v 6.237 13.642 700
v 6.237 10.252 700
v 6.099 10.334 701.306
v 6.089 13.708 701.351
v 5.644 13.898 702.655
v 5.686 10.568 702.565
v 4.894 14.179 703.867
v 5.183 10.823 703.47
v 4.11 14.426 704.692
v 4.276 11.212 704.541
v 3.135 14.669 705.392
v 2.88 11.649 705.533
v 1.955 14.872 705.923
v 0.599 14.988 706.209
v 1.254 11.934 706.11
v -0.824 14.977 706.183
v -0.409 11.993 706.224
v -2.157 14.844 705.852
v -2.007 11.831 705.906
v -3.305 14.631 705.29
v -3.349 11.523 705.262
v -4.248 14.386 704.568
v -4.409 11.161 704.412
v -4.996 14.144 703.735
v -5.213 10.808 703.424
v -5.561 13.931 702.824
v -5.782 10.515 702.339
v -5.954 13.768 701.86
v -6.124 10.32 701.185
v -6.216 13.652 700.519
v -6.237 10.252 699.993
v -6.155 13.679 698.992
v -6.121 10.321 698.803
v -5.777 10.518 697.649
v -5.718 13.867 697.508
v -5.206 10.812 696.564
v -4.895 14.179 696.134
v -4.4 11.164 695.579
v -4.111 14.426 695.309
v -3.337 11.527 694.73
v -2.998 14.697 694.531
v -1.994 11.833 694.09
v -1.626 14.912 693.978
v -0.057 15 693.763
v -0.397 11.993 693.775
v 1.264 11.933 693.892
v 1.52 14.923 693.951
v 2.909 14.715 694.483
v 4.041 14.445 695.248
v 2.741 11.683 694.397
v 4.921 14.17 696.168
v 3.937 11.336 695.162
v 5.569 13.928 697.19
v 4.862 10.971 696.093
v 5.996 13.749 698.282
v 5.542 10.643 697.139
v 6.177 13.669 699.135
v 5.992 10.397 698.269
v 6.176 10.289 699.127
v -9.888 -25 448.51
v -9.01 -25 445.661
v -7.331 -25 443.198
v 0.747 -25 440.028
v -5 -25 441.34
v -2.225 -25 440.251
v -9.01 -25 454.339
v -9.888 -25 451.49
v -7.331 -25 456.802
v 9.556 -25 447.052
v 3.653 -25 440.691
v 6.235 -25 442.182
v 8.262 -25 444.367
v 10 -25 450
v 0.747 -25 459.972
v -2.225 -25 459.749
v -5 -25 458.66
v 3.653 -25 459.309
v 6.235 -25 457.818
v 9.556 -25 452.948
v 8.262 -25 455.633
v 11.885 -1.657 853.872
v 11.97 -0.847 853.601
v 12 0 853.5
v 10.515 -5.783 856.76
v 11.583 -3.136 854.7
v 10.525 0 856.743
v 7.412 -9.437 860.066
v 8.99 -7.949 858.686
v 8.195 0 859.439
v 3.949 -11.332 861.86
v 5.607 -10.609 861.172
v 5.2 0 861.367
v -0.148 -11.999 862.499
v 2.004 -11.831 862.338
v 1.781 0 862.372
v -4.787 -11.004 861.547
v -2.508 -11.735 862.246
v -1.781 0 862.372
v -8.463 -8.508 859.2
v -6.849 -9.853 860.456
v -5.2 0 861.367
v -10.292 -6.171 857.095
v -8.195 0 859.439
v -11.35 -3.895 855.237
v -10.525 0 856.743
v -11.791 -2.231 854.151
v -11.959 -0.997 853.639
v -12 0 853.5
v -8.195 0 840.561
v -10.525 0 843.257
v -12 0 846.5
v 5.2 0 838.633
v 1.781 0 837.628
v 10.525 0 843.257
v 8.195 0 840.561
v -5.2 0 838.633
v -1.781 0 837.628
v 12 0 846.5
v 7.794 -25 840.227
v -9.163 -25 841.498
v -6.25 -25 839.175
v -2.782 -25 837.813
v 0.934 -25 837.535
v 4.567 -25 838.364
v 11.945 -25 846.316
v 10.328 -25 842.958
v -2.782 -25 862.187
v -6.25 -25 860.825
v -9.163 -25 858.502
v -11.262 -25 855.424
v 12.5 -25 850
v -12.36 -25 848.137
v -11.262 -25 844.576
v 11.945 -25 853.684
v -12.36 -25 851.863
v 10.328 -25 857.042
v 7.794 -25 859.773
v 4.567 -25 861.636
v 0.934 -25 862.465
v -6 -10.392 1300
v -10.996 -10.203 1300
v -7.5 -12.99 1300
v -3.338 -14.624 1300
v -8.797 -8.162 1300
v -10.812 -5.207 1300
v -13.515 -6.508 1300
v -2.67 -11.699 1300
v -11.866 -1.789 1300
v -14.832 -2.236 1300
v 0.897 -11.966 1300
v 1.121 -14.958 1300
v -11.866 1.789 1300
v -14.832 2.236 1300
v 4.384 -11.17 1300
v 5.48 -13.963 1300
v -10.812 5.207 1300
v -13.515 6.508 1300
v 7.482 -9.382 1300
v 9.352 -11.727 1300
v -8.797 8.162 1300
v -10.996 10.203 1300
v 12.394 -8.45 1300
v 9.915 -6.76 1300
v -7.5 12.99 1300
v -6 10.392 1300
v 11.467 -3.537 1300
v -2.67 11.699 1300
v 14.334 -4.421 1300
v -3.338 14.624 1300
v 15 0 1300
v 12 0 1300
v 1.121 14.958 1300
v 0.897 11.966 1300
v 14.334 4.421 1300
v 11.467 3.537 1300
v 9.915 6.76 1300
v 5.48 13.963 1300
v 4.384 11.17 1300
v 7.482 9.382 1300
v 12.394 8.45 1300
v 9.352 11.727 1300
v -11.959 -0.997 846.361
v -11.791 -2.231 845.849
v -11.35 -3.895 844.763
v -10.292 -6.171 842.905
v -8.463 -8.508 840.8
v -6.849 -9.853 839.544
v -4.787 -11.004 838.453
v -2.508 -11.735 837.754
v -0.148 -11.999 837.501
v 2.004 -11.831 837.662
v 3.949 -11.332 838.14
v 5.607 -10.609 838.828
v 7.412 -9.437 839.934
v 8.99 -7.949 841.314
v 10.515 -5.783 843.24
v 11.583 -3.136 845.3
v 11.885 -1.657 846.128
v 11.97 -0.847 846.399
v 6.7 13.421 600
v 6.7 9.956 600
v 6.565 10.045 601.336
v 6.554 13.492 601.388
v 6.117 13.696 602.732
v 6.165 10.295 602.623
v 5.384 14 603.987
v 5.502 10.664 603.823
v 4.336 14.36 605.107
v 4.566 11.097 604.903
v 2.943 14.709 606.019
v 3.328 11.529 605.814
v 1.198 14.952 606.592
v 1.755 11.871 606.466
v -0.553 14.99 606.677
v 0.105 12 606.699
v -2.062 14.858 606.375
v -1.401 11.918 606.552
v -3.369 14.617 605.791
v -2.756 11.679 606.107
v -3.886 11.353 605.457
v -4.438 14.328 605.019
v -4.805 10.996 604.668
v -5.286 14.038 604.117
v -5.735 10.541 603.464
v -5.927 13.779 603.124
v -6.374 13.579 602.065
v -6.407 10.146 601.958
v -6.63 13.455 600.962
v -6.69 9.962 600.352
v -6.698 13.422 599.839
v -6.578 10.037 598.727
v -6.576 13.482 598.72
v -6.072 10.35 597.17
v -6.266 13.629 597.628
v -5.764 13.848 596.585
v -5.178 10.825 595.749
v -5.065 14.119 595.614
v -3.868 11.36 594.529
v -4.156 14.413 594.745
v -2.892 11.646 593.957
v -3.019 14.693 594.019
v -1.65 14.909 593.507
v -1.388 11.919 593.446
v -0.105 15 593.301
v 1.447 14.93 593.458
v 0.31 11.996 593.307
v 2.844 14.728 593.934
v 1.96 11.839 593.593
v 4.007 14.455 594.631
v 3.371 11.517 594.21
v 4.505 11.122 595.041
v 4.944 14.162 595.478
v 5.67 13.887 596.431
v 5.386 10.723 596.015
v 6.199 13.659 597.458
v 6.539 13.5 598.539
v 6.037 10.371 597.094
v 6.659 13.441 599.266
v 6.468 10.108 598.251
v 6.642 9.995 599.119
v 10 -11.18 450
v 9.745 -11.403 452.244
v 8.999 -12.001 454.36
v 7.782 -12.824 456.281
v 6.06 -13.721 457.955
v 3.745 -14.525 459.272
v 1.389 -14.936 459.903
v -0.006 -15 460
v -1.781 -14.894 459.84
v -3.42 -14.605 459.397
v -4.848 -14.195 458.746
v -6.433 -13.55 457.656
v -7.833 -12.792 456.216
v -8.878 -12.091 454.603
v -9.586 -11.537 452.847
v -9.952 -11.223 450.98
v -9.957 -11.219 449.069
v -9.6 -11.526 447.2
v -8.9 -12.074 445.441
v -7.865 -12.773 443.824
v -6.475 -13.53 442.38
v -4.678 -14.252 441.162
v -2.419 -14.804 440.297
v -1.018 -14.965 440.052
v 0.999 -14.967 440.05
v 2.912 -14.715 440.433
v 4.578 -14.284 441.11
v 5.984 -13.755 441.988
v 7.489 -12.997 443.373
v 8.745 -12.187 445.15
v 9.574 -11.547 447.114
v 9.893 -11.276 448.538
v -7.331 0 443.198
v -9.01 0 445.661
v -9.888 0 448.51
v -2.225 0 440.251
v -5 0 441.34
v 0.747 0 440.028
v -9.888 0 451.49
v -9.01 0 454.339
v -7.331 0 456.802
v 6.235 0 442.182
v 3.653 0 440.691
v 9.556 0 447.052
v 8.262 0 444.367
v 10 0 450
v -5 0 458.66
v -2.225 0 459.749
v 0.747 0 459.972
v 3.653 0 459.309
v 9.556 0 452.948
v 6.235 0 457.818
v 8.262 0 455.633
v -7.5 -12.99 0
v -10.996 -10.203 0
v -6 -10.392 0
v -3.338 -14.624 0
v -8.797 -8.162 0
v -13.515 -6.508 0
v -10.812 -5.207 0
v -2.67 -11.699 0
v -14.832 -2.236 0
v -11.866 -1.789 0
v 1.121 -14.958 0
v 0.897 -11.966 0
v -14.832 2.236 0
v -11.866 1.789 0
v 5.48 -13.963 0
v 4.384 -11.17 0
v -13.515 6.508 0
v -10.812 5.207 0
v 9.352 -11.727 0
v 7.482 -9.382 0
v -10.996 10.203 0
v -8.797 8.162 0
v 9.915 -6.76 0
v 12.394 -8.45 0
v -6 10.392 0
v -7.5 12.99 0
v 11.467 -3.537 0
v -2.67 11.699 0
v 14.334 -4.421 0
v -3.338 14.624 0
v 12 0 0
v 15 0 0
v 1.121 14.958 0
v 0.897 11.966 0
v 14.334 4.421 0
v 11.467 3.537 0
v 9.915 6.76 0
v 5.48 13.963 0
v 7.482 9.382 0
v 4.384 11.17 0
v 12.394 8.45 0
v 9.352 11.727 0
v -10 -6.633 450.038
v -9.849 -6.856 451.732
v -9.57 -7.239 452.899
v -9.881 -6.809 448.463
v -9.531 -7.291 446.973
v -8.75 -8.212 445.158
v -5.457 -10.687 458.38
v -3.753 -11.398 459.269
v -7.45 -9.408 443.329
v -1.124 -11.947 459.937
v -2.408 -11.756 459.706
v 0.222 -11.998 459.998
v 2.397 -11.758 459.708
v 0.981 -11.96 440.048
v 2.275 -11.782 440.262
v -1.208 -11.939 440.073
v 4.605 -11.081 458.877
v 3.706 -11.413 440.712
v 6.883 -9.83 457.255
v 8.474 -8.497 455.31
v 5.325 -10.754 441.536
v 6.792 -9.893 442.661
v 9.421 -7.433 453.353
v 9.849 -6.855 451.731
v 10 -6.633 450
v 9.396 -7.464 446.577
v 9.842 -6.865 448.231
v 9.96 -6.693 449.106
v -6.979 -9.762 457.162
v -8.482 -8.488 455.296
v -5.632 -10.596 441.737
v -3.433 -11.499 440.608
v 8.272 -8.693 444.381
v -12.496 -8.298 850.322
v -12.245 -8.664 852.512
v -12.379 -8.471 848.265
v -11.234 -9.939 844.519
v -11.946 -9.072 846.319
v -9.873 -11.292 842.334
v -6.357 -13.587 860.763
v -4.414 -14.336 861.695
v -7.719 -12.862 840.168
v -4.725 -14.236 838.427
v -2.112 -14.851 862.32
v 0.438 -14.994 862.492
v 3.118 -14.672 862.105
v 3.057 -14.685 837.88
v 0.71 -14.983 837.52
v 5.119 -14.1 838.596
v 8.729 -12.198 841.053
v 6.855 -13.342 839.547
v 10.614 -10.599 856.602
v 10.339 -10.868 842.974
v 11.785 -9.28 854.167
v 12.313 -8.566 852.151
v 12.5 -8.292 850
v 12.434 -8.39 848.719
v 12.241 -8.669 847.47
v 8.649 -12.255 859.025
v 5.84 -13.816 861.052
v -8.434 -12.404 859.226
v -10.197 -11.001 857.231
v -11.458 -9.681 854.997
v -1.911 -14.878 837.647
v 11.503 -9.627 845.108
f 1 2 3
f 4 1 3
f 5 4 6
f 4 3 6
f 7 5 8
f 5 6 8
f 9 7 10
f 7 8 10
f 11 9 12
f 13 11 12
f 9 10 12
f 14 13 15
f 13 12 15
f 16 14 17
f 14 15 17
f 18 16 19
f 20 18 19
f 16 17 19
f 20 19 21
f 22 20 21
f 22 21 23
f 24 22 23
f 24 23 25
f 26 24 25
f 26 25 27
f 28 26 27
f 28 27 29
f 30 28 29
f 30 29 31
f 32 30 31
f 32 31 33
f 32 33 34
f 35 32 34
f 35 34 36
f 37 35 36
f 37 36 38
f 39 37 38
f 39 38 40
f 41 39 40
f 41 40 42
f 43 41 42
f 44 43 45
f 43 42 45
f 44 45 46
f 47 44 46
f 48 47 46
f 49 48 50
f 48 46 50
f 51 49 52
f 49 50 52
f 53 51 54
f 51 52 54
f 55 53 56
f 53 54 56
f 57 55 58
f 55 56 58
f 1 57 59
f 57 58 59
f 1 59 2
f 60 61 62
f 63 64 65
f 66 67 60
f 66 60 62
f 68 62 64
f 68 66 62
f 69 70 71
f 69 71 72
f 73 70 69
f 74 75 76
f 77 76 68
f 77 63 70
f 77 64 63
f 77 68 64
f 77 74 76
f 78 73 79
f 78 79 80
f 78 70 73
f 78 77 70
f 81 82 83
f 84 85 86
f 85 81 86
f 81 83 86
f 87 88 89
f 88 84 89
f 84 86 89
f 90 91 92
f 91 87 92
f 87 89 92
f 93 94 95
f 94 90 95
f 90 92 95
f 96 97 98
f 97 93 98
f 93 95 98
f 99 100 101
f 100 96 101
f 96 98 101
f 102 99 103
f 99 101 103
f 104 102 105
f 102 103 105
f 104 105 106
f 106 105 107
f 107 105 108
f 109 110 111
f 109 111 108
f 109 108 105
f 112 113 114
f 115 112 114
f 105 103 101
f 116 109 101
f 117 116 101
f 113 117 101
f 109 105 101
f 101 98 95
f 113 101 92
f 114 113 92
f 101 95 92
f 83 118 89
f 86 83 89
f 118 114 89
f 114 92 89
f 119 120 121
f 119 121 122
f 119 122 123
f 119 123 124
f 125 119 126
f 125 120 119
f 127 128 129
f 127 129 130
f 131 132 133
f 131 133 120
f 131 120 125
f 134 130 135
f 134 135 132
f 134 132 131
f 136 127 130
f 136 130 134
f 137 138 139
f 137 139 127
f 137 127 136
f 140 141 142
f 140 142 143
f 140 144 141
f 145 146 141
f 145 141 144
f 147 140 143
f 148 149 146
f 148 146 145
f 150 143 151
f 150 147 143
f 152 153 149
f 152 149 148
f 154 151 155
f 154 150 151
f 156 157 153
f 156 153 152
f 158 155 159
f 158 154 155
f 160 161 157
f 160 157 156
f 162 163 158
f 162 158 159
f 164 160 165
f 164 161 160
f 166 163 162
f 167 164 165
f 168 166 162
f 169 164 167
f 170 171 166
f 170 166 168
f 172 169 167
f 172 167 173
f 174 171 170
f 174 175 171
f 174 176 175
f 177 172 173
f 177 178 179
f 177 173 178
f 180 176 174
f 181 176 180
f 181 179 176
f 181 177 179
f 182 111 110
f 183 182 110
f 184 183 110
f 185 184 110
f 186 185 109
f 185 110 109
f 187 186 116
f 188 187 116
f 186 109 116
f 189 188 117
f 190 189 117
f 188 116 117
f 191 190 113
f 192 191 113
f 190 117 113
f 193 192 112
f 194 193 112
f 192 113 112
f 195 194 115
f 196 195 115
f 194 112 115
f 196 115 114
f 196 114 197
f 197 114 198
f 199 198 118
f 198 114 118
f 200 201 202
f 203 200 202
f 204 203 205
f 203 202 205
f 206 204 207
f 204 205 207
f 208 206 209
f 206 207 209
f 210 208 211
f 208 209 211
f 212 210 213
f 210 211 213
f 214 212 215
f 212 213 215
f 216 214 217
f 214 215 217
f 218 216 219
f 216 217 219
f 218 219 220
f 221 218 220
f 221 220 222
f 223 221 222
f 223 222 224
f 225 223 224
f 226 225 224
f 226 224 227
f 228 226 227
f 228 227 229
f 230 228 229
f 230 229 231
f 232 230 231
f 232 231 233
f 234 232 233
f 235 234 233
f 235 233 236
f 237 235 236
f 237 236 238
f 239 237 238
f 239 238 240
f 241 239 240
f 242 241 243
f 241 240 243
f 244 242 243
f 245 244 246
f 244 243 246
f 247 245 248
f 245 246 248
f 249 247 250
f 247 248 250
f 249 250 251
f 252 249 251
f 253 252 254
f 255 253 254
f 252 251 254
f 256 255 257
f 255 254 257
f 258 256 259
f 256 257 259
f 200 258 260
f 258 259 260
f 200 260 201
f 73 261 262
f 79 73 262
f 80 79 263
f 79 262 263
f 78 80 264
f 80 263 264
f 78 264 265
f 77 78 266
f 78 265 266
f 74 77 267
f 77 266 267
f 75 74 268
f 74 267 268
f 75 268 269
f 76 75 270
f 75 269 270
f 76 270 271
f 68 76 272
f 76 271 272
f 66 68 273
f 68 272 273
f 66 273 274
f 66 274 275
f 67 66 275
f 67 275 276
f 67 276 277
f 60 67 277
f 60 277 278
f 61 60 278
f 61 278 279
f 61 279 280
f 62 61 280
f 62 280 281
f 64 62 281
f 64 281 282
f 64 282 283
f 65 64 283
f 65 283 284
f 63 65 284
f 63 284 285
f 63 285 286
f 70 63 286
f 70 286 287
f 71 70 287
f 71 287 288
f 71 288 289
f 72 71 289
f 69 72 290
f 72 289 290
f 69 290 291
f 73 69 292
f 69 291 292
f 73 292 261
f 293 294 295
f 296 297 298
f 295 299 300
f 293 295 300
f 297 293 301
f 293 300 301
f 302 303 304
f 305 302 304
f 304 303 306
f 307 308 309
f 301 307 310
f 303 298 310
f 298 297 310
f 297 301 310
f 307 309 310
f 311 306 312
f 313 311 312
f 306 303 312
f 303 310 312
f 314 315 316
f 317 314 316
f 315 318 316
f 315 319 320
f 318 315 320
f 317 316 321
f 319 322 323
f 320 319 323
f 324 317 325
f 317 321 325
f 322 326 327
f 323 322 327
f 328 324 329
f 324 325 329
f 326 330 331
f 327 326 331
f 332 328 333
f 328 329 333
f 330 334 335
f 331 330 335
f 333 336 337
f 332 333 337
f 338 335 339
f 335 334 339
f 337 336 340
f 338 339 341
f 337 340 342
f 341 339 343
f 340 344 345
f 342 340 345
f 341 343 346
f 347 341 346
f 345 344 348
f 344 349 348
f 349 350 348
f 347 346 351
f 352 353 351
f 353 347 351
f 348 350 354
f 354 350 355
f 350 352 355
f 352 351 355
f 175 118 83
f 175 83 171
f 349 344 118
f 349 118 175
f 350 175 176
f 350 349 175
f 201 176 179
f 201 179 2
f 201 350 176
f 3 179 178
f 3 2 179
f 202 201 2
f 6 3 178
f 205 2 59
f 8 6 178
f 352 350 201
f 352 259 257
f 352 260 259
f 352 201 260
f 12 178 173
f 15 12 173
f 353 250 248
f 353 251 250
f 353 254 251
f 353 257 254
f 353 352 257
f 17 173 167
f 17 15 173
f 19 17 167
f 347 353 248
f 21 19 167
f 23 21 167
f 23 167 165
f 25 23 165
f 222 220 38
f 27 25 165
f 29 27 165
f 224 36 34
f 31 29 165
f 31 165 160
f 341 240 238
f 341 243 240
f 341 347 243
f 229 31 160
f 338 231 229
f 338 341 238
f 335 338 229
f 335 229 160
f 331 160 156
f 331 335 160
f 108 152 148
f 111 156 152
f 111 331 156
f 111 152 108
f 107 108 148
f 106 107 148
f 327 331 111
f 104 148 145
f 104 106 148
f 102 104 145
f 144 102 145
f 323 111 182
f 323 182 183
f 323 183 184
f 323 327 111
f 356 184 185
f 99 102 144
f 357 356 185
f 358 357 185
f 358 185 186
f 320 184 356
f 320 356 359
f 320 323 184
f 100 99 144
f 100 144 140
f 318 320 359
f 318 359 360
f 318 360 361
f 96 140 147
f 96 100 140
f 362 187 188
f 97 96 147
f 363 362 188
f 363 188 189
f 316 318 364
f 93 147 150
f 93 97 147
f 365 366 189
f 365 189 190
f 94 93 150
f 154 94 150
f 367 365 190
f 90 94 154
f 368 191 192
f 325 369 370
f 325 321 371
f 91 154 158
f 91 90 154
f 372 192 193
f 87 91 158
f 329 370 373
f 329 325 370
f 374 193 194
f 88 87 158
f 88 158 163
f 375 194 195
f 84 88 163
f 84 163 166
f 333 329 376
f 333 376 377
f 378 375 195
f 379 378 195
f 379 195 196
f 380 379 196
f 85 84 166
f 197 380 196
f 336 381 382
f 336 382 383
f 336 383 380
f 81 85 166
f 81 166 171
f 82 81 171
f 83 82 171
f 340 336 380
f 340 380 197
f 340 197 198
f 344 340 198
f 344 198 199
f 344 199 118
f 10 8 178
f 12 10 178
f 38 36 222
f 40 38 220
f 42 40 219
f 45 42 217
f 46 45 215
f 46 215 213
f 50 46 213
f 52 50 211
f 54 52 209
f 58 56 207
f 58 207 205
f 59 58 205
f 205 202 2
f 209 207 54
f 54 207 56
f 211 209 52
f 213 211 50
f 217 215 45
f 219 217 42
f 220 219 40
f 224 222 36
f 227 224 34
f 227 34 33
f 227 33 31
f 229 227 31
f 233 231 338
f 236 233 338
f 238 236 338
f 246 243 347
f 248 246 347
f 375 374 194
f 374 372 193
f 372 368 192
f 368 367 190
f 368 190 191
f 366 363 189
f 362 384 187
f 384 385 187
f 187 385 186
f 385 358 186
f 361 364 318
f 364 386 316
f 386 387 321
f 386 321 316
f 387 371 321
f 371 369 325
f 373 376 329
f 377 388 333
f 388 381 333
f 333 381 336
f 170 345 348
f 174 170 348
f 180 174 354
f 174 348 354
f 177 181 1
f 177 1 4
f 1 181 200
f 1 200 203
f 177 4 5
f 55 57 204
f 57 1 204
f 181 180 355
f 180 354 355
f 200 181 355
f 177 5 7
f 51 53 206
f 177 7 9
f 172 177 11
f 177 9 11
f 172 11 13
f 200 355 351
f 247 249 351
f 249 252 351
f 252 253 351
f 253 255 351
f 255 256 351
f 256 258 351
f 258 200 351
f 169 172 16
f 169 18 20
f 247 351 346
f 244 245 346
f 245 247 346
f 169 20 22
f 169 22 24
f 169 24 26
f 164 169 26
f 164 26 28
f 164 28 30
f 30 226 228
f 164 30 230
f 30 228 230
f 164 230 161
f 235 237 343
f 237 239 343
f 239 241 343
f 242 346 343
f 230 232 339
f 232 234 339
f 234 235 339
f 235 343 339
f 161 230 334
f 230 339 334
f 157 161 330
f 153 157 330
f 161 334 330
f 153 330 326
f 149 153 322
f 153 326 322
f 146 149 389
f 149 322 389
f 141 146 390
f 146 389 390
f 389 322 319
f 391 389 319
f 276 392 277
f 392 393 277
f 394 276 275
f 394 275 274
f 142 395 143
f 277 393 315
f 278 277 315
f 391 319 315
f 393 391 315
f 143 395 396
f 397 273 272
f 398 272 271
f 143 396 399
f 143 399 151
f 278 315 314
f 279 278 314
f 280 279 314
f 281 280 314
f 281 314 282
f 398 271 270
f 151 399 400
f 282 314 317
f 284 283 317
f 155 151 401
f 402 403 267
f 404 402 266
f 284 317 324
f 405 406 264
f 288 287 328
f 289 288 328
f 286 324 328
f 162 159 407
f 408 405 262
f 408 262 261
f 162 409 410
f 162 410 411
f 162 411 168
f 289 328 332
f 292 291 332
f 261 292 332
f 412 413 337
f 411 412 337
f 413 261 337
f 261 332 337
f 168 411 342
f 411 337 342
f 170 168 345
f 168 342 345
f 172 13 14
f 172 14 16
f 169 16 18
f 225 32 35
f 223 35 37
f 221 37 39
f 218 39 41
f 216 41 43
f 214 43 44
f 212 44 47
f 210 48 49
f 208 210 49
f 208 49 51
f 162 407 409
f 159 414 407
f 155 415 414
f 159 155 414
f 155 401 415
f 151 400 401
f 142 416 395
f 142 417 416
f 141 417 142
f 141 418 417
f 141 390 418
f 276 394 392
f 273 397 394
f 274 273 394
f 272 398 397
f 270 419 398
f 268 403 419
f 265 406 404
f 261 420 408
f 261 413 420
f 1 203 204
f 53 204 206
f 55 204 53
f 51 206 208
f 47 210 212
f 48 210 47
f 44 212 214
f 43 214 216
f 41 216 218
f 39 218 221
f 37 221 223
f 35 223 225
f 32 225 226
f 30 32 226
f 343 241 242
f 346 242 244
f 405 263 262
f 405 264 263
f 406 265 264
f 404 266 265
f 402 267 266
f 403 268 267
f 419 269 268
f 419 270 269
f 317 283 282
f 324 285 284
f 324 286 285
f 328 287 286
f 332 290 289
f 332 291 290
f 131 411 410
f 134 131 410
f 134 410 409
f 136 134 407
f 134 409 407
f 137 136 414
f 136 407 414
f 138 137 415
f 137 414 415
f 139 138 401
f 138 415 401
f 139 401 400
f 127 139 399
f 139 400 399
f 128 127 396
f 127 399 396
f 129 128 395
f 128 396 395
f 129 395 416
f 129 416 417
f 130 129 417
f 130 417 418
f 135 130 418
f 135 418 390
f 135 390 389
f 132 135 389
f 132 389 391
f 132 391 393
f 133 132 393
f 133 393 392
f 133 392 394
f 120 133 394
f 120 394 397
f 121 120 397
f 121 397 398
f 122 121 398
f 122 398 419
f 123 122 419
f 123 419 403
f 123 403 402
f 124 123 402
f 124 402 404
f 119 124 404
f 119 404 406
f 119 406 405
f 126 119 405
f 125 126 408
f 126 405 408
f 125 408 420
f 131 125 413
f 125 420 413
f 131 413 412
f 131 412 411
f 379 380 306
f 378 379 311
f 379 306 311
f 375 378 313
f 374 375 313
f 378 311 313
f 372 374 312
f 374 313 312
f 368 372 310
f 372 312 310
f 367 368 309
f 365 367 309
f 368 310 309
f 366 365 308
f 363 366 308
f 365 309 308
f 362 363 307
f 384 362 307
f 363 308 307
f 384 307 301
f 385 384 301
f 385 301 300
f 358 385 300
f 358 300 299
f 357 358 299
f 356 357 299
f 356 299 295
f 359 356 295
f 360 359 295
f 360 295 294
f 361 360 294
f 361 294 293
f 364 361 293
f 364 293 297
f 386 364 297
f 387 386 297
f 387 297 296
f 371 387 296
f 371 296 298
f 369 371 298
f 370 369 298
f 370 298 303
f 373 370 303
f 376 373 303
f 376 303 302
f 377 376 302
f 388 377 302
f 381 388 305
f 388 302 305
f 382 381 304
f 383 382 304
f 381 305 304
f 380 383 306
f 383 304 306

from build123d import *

# Parameters (mm, degrees)
F0_R     = 15
F0_R_2   = 12
F1_DEPTH = 1300
F2_R     = 6.699754
F2_R_2   = 6.23735
F3_DEPTH = 25
F4_R     = 10
F4_R_2   = 12.5
F5_DEPTH = 25


with BuildPart() as f1:
    # F0 (on Top) → F1 (new body)
    with BuildSketch(Plane.XY):
        Circle(F0_R)
        Circle(F0_R_2, mode=Mode.SUBTRACT)
    extrude(amount=F1_DEPTH)

    # F2 (on Front) → F3 (cut)
    with BuildSketch(Plane.XZ):
        with Locations((0, 600)):
            Circle(F2_R)
        with Locations((0, 700)):
            Circle(F2_R_2)
    extrude(amount=-F3_DEPTH, mode=Mode.SUBTRACT)

    # F4 (on Front) → F5 (join)
    with BuildSketch(Plane.XZ):
        with Locations((0, 450)):
            Circle(F4_R)
        with Locations((0, 850)):
            Circle(F4_R_2)
    extrude(amount=F5_DEPTH)


solid = f1.part
